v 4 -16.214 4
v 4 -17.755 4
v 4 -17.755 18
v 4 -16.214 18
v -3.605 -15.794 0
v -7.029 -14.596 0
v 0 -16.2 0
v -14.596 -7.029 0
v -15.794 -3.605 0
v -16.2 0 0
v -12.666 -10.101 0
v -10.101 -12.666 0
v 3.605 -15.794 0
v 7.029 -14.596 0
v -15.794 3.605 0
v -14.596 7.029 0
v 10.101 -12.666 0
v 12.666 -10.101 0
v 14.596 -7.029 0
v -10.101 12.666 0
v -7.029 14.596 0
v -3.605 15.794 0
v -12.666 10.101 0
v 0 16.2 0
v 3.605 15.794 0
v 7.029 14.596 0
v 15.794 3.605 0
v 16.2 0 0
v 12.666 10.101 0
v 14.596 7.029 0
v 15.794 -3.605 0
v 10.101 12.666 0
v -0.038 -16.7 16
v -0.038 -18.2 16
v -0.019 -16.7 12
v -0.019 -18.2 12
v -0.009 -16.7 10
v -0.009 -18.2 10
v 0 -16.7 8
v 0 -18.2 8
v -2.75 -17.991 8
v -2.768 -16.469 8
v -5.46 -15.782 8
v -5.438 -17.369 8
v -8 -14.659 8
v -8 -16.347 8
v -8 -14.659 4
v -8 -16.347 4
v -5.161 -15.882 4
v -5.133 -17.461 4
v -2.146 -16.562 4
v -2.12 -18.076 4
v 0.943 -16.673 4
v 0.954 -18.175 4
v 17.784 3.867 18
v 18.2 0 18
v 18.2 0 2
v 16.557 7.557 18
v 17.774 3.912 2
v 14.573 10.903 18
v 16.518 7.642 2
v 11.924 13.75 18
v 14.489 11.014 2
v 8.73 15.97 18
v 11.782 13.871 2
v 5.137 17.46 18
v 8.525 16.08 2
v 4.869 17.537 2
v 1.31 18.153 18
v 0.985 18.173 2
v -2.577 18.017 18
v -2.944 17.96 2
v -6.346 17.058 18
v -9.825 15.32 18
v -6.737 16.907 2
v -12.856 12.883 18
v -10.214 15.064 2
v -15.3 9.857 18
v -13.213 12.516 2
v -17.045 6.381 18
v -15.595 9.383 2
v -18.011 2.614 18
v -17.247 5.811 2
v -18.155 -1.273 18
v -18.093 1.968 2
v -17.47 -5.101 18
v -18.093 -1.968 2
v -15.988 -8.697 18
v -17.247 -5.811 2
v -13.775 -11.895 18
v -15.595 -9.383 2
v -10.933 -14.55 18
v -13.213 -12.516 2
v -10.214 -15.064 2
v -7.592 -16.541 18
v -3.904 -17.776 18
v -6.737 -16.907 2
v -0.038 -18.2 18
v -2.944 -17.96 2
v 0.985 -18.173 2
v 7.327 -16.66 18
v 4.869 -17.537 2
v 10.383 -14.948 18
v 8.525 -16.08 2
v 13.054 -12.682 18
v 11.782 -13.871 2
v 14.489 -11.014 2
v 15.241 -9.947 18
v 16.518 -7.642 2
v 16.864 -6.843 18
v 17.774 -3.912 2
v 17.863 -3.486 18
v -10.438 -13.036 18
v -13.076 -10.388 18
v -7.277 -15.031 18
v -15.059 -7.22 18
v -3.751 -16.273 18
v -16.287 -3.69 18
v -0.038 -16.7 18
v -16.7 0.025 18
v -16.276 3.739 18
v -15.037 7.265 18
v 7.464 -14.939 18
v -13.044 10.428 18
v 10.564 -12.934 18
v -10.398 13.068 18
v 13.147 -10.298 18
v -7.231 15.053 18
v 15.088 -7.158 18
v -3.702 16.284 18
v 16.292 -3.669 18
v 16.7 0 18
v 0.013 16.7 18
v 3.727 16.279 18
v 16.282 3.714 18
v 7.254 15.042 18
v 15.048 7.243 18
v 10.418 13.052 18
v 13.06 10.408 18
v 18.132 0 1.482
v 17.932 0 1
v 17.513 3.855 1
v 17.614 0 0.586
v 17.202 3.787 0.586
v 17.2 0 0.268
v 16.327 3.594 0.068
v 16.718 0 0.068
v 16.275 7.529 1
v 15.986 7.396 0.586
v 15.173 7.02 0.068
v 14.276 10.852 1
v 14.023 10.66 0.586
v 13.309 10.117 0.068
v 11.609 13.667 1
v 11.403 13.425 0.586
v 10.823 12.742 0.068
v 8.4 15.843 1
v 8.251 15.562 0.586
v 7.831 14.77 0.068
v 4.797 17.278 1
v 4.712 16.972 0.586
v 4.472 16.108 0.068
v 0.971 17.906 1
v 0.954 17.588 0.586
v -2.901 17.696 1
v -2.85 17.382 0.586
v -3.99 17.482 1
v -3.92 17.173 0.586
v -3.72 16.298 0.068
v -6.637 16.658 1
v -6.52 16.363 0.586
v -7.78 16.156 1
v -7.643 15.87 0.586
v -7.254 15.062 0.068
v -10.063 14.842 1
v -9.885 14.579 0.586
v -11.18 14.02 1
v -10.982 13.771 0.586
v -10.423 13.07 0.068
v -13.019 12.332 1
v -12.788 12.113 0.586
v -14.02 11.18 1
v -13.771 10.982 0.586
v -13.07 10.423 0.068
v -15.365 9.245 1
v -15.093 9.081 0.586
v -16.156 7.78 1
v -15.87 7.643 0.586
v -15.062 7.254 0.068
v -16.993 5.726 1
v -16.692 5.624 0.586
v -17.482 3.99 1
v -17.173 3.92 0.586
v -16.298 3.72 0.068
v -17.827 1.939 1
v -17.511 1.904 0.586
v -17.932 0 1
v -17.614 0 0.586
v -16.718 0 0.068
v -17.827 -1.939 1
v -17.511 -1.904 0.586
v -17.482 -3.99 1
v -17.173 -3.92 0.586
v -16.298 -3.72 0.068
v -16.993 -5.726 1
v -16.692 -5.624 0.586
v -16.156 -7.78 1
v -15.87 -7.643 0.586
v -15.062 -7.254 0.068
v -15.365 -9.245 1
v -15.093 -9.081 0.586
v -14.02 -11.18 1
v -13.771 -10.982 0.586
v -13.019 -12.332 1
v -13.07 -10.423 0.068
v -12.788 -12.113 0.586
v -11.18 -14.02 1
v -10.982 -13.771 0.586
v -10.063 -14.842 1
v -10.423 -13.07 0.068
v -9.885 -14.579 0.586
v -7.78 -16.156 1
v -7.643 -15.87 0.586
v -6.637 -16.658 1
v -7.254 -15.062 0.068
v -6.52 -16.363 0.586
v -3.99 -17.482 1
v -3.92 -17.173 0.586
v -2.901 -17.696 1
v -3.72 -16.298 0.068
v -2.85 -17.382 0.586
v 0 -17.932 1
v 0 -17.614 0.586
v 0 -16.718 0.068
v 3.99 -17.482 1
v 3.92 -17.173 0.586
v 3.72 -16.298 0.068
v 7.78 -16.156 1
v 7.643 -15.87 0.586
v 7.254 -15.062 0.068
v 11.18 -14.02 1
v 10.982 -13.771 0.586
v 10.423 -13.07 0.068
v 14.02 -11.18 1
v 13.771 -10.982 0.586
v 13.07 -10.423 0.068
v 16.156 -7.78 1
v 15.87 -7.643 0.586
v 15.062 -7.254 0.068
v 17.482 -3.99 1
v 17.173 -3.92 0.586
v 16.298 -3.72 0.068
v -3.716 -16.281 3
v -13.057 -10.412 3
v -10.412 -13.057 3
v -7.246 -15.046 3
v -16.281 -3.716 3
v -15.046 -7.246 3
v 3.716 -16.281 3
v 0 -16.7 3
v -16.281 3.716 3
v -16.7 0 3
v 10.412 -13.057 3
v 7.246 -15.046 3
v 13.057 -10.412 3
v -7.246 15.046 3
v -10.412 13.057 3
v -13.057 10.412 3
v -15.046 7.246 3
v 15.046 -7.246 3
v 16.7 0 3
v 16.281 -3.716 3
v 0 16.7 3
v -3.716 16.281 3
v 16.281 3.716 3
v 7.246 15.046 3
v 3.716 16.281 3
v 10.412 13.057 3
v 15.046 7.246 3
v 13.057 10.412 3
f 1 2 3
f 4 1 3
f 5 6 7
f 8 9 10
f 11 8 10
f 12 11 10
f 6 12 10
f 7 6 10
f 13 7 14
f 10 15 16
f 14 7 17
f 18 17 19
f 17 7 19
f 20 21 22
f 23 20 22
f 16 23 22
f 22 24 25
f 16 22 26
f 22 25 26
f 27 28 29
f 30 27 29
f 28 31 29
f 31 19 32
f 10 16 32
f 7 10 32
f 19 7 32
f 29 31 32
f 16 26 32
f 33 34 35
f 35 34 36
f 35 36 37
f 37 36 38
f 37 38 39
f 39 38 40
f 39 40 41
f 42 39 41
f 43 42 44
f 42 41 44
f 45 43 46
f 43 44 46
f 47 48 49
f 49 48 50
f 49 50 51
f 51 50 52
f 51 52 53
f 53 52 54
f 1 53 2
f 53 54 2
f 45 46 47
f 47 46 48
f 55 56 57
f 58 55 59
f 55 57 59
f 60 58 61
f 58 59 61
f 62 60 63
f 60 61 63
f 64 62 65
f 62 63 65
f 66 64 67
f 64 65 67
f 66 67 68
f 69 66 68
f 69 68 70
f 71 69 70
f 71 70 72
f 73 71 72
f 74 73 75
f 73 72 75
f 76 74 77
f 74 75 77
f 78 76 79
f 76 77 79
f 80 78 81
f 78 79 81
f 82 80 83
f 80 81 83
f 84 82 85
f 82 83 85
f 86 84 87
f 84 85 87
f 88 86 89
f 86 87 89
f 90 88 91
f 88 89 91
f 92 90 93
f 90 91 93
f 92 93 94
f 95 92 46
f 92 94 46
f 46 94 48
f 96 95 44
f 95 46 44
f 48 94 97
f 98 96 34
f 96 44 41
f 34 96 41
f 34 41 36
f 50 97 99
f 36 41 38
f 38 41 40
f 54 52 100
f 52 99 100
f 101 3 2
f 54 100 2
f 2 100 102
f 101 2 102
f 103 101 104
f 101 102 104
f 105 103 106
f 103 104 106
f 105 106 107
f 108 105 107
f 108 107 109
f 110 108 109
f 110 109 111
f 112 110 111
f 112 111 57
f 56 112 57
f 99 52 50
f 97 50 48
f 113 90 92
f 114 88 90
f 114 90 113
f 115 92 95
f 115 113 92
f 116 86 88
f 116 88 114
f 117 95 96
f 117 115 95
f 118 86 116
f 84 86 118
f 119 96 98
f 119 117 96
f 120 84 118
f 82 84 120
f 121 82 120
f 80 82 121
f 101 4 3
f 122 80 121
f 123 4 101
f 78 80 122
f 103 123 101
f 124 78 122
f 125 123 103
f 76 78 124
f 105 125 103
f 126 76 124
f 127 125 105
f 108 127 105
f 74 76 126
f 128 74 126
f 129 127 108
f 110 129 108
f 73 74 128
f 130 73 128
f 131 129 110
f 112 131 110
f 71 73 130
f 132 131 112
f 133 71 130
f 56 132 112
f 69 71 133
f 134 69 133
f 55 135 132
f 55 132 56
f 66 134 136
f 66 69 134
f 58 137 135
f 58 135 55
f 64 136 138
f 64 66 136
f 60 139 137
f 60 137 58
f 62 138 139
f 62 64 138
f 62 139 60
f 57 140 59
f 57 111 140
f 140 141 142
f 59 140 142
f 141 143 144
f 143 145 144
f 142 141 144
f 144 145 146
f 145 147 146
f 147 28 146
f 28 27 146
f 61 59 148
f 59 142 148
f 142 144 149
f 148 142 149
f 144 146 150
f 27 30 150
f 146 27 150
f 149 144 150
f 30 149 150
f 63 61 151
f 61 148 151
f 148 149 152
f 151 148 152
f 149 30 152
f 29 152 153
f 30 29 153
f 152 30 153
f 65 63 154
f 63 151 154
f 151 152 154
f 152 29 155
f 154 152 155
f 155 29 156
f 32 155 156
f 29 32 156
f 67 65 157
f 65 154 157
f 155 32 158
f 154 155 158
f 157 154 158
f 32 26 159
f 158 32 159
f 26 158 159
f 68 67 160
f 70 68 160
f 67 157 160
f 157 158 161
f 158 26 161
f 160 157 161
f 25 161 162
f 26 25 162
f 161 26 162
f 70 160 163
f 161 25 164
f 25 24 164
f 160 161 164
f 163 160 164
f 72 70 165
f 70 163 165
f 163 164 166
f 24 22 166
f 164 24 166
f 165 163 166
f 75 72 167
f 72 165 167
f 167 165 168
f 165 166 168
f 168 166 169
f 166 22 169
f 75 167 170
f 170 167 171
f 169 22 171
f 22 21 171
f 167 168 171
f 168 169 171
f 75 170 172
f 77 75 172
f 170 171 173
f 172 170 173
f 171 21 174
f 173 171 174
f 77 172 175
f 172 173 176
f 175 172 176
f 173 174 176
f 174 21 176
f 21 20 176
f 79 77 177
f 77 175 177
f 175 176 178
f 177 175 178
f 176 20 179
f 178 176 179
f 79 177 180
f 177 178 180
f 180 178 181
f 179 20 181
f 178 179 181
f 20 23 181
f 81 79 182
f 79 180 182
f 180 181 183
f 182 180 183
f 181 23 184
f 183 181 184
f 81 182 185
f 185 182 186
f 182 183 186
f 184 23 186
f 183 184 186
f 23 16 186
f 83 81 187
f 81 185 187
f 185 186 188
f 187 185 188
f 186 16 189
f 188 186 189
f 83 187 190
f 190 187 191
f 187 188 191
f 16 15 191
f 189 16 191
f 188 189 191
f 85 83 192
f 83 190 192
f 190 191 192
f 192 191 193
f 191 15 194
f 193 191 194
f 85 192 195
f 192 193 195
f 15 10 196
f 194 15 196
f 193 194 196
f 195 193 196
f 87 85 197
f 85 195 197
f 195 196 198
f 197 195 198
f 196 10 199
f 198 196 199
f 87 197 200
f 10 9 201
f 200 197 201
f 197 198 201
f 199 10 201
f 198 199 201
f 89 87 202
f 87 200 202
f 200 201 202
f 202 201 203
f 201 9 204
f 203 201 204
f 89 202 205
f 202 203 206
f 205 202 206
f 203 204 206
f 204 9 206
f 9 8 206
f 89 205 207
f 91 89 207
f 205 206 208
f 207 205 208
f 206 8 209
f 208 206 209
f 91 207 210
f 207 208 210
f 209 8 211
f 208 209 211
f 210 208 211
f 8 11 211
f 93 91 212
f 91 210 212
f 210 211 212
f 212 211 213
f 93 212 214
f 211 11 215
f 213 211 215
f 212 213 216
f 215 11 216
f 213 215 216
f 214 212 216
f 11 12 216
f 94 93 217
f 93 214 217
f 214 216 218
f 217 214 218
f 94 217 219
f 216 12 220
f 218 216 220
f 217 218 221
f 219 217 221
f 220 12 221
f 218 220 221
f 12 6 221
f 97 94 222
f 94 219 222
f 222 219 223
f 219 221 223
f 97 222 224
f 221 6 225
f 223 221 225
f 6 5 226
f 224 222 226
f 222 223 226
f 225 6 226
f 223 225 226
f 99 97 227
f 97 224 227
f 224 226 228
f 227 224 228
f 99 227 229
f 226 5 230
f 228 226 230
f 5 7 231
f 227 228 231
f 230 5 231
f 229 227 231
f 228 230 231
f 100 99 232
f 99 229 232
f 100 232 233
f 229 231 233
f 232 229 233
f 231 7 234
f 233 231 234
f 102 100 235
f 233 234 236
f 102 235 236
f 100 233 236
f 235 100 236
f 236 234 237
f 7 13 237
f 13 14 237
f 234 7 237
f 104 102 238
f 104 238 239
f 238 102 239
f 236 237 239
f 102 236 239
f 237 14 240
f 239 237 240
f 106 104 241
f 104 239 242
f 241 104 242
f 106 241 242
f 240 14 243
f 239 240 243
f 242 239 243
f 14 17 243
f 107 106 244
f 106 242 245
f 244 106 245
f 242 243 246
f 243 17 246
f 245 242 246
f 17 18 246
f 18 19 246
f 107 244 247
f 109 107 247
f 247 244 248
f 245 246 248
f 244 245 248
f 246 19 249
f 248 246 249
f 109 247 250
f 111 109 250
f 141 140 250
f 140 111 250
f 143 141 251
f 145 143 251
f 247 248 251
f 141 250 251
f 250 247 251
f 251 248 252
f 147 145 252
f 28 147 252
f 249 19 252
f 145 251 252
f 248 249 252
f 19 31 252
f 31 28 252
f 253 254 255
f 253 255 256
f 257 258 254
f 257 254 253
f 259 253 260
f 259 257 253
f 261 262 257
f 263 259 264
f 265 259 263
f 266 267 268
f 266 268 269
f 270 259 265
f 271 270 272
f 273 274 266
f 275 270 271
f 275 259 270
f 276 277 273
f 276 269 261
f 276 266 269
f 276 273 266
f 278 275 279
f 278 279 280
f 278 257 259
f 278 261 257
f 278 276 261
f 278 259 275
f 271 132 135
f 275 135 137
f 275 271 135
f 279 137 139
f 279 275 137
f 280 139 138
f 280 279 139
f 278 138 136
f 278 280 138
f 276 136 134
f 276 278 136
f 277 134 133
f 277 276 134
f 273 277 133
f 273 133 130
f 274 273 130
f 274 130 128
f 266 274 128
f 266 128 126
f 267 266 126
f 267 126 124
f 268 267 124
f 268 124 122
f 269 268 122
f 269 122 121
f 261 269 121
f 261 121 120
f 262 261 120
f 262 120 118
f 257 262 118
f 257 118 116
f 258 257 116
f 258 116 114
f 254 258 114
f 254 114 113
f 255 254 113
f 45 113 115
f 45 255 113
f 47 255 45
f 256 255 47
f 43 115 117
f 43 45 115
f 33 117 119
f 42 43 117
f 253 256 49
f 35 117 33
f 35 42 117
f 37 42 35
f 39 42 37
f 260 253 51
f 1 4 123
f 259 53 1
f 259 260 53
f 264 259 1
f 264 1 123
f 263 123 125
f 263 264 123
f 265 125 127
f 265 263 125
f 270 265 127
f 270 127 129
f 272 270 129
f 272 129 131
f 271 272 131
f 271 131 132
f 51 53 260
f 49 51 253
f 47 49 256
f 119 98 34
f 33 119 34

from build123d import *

# Parameters (mm, degrees)
F0_R     = 18.2
F0_R_2   = 16.7
F1_DEPTH = 3
F2_R     = 18.2
F2_R_2   = 16.7
F3_DEPTH = 15
F6_DEPTH = 10
F7_R     = 2


with BuildPart() as f1:
    # F0 (on Top) → F1 (new body)
    with BuildSketch(Plane.XY):
        Circle(F0_R)
        Circle(F0_R_2, mode=Mode.SUBTRACT)
        Circle(F0_R_2)
    extrude(amount=F1_DEPTH)

    # F2 (on face) → F3 (join)
    with BuildSketch(Plane.XY.offset(3)):
        Circle(F2_R)
        Circle(F2_R_2, mode=Mode.SUBTRACT)
    extrude(amount=F3_DEPTH)

    # F5 (on offset) → F6 (cut)
    with BuildSketch(Plane.XZ.offset(18.2)):
        Polygon((-0.037793, 15.999911), (0, 8), (-8, 8), (-8, 4), (4, 4), (4, 20), (3.962207, 19.999911), (-0.037793, 19.999911), align=None)
    extrude(amount=-F6_DEPTH, mode=Mode.SUBTRACT)

    # F7
    f7_edges = [f1.edges().sort_by_distance(p)[0] for p in [
        (-18.2, 0, 0),
    ]]
    fillet(f7_edges, radius=F7_R)


solid = f1.part
